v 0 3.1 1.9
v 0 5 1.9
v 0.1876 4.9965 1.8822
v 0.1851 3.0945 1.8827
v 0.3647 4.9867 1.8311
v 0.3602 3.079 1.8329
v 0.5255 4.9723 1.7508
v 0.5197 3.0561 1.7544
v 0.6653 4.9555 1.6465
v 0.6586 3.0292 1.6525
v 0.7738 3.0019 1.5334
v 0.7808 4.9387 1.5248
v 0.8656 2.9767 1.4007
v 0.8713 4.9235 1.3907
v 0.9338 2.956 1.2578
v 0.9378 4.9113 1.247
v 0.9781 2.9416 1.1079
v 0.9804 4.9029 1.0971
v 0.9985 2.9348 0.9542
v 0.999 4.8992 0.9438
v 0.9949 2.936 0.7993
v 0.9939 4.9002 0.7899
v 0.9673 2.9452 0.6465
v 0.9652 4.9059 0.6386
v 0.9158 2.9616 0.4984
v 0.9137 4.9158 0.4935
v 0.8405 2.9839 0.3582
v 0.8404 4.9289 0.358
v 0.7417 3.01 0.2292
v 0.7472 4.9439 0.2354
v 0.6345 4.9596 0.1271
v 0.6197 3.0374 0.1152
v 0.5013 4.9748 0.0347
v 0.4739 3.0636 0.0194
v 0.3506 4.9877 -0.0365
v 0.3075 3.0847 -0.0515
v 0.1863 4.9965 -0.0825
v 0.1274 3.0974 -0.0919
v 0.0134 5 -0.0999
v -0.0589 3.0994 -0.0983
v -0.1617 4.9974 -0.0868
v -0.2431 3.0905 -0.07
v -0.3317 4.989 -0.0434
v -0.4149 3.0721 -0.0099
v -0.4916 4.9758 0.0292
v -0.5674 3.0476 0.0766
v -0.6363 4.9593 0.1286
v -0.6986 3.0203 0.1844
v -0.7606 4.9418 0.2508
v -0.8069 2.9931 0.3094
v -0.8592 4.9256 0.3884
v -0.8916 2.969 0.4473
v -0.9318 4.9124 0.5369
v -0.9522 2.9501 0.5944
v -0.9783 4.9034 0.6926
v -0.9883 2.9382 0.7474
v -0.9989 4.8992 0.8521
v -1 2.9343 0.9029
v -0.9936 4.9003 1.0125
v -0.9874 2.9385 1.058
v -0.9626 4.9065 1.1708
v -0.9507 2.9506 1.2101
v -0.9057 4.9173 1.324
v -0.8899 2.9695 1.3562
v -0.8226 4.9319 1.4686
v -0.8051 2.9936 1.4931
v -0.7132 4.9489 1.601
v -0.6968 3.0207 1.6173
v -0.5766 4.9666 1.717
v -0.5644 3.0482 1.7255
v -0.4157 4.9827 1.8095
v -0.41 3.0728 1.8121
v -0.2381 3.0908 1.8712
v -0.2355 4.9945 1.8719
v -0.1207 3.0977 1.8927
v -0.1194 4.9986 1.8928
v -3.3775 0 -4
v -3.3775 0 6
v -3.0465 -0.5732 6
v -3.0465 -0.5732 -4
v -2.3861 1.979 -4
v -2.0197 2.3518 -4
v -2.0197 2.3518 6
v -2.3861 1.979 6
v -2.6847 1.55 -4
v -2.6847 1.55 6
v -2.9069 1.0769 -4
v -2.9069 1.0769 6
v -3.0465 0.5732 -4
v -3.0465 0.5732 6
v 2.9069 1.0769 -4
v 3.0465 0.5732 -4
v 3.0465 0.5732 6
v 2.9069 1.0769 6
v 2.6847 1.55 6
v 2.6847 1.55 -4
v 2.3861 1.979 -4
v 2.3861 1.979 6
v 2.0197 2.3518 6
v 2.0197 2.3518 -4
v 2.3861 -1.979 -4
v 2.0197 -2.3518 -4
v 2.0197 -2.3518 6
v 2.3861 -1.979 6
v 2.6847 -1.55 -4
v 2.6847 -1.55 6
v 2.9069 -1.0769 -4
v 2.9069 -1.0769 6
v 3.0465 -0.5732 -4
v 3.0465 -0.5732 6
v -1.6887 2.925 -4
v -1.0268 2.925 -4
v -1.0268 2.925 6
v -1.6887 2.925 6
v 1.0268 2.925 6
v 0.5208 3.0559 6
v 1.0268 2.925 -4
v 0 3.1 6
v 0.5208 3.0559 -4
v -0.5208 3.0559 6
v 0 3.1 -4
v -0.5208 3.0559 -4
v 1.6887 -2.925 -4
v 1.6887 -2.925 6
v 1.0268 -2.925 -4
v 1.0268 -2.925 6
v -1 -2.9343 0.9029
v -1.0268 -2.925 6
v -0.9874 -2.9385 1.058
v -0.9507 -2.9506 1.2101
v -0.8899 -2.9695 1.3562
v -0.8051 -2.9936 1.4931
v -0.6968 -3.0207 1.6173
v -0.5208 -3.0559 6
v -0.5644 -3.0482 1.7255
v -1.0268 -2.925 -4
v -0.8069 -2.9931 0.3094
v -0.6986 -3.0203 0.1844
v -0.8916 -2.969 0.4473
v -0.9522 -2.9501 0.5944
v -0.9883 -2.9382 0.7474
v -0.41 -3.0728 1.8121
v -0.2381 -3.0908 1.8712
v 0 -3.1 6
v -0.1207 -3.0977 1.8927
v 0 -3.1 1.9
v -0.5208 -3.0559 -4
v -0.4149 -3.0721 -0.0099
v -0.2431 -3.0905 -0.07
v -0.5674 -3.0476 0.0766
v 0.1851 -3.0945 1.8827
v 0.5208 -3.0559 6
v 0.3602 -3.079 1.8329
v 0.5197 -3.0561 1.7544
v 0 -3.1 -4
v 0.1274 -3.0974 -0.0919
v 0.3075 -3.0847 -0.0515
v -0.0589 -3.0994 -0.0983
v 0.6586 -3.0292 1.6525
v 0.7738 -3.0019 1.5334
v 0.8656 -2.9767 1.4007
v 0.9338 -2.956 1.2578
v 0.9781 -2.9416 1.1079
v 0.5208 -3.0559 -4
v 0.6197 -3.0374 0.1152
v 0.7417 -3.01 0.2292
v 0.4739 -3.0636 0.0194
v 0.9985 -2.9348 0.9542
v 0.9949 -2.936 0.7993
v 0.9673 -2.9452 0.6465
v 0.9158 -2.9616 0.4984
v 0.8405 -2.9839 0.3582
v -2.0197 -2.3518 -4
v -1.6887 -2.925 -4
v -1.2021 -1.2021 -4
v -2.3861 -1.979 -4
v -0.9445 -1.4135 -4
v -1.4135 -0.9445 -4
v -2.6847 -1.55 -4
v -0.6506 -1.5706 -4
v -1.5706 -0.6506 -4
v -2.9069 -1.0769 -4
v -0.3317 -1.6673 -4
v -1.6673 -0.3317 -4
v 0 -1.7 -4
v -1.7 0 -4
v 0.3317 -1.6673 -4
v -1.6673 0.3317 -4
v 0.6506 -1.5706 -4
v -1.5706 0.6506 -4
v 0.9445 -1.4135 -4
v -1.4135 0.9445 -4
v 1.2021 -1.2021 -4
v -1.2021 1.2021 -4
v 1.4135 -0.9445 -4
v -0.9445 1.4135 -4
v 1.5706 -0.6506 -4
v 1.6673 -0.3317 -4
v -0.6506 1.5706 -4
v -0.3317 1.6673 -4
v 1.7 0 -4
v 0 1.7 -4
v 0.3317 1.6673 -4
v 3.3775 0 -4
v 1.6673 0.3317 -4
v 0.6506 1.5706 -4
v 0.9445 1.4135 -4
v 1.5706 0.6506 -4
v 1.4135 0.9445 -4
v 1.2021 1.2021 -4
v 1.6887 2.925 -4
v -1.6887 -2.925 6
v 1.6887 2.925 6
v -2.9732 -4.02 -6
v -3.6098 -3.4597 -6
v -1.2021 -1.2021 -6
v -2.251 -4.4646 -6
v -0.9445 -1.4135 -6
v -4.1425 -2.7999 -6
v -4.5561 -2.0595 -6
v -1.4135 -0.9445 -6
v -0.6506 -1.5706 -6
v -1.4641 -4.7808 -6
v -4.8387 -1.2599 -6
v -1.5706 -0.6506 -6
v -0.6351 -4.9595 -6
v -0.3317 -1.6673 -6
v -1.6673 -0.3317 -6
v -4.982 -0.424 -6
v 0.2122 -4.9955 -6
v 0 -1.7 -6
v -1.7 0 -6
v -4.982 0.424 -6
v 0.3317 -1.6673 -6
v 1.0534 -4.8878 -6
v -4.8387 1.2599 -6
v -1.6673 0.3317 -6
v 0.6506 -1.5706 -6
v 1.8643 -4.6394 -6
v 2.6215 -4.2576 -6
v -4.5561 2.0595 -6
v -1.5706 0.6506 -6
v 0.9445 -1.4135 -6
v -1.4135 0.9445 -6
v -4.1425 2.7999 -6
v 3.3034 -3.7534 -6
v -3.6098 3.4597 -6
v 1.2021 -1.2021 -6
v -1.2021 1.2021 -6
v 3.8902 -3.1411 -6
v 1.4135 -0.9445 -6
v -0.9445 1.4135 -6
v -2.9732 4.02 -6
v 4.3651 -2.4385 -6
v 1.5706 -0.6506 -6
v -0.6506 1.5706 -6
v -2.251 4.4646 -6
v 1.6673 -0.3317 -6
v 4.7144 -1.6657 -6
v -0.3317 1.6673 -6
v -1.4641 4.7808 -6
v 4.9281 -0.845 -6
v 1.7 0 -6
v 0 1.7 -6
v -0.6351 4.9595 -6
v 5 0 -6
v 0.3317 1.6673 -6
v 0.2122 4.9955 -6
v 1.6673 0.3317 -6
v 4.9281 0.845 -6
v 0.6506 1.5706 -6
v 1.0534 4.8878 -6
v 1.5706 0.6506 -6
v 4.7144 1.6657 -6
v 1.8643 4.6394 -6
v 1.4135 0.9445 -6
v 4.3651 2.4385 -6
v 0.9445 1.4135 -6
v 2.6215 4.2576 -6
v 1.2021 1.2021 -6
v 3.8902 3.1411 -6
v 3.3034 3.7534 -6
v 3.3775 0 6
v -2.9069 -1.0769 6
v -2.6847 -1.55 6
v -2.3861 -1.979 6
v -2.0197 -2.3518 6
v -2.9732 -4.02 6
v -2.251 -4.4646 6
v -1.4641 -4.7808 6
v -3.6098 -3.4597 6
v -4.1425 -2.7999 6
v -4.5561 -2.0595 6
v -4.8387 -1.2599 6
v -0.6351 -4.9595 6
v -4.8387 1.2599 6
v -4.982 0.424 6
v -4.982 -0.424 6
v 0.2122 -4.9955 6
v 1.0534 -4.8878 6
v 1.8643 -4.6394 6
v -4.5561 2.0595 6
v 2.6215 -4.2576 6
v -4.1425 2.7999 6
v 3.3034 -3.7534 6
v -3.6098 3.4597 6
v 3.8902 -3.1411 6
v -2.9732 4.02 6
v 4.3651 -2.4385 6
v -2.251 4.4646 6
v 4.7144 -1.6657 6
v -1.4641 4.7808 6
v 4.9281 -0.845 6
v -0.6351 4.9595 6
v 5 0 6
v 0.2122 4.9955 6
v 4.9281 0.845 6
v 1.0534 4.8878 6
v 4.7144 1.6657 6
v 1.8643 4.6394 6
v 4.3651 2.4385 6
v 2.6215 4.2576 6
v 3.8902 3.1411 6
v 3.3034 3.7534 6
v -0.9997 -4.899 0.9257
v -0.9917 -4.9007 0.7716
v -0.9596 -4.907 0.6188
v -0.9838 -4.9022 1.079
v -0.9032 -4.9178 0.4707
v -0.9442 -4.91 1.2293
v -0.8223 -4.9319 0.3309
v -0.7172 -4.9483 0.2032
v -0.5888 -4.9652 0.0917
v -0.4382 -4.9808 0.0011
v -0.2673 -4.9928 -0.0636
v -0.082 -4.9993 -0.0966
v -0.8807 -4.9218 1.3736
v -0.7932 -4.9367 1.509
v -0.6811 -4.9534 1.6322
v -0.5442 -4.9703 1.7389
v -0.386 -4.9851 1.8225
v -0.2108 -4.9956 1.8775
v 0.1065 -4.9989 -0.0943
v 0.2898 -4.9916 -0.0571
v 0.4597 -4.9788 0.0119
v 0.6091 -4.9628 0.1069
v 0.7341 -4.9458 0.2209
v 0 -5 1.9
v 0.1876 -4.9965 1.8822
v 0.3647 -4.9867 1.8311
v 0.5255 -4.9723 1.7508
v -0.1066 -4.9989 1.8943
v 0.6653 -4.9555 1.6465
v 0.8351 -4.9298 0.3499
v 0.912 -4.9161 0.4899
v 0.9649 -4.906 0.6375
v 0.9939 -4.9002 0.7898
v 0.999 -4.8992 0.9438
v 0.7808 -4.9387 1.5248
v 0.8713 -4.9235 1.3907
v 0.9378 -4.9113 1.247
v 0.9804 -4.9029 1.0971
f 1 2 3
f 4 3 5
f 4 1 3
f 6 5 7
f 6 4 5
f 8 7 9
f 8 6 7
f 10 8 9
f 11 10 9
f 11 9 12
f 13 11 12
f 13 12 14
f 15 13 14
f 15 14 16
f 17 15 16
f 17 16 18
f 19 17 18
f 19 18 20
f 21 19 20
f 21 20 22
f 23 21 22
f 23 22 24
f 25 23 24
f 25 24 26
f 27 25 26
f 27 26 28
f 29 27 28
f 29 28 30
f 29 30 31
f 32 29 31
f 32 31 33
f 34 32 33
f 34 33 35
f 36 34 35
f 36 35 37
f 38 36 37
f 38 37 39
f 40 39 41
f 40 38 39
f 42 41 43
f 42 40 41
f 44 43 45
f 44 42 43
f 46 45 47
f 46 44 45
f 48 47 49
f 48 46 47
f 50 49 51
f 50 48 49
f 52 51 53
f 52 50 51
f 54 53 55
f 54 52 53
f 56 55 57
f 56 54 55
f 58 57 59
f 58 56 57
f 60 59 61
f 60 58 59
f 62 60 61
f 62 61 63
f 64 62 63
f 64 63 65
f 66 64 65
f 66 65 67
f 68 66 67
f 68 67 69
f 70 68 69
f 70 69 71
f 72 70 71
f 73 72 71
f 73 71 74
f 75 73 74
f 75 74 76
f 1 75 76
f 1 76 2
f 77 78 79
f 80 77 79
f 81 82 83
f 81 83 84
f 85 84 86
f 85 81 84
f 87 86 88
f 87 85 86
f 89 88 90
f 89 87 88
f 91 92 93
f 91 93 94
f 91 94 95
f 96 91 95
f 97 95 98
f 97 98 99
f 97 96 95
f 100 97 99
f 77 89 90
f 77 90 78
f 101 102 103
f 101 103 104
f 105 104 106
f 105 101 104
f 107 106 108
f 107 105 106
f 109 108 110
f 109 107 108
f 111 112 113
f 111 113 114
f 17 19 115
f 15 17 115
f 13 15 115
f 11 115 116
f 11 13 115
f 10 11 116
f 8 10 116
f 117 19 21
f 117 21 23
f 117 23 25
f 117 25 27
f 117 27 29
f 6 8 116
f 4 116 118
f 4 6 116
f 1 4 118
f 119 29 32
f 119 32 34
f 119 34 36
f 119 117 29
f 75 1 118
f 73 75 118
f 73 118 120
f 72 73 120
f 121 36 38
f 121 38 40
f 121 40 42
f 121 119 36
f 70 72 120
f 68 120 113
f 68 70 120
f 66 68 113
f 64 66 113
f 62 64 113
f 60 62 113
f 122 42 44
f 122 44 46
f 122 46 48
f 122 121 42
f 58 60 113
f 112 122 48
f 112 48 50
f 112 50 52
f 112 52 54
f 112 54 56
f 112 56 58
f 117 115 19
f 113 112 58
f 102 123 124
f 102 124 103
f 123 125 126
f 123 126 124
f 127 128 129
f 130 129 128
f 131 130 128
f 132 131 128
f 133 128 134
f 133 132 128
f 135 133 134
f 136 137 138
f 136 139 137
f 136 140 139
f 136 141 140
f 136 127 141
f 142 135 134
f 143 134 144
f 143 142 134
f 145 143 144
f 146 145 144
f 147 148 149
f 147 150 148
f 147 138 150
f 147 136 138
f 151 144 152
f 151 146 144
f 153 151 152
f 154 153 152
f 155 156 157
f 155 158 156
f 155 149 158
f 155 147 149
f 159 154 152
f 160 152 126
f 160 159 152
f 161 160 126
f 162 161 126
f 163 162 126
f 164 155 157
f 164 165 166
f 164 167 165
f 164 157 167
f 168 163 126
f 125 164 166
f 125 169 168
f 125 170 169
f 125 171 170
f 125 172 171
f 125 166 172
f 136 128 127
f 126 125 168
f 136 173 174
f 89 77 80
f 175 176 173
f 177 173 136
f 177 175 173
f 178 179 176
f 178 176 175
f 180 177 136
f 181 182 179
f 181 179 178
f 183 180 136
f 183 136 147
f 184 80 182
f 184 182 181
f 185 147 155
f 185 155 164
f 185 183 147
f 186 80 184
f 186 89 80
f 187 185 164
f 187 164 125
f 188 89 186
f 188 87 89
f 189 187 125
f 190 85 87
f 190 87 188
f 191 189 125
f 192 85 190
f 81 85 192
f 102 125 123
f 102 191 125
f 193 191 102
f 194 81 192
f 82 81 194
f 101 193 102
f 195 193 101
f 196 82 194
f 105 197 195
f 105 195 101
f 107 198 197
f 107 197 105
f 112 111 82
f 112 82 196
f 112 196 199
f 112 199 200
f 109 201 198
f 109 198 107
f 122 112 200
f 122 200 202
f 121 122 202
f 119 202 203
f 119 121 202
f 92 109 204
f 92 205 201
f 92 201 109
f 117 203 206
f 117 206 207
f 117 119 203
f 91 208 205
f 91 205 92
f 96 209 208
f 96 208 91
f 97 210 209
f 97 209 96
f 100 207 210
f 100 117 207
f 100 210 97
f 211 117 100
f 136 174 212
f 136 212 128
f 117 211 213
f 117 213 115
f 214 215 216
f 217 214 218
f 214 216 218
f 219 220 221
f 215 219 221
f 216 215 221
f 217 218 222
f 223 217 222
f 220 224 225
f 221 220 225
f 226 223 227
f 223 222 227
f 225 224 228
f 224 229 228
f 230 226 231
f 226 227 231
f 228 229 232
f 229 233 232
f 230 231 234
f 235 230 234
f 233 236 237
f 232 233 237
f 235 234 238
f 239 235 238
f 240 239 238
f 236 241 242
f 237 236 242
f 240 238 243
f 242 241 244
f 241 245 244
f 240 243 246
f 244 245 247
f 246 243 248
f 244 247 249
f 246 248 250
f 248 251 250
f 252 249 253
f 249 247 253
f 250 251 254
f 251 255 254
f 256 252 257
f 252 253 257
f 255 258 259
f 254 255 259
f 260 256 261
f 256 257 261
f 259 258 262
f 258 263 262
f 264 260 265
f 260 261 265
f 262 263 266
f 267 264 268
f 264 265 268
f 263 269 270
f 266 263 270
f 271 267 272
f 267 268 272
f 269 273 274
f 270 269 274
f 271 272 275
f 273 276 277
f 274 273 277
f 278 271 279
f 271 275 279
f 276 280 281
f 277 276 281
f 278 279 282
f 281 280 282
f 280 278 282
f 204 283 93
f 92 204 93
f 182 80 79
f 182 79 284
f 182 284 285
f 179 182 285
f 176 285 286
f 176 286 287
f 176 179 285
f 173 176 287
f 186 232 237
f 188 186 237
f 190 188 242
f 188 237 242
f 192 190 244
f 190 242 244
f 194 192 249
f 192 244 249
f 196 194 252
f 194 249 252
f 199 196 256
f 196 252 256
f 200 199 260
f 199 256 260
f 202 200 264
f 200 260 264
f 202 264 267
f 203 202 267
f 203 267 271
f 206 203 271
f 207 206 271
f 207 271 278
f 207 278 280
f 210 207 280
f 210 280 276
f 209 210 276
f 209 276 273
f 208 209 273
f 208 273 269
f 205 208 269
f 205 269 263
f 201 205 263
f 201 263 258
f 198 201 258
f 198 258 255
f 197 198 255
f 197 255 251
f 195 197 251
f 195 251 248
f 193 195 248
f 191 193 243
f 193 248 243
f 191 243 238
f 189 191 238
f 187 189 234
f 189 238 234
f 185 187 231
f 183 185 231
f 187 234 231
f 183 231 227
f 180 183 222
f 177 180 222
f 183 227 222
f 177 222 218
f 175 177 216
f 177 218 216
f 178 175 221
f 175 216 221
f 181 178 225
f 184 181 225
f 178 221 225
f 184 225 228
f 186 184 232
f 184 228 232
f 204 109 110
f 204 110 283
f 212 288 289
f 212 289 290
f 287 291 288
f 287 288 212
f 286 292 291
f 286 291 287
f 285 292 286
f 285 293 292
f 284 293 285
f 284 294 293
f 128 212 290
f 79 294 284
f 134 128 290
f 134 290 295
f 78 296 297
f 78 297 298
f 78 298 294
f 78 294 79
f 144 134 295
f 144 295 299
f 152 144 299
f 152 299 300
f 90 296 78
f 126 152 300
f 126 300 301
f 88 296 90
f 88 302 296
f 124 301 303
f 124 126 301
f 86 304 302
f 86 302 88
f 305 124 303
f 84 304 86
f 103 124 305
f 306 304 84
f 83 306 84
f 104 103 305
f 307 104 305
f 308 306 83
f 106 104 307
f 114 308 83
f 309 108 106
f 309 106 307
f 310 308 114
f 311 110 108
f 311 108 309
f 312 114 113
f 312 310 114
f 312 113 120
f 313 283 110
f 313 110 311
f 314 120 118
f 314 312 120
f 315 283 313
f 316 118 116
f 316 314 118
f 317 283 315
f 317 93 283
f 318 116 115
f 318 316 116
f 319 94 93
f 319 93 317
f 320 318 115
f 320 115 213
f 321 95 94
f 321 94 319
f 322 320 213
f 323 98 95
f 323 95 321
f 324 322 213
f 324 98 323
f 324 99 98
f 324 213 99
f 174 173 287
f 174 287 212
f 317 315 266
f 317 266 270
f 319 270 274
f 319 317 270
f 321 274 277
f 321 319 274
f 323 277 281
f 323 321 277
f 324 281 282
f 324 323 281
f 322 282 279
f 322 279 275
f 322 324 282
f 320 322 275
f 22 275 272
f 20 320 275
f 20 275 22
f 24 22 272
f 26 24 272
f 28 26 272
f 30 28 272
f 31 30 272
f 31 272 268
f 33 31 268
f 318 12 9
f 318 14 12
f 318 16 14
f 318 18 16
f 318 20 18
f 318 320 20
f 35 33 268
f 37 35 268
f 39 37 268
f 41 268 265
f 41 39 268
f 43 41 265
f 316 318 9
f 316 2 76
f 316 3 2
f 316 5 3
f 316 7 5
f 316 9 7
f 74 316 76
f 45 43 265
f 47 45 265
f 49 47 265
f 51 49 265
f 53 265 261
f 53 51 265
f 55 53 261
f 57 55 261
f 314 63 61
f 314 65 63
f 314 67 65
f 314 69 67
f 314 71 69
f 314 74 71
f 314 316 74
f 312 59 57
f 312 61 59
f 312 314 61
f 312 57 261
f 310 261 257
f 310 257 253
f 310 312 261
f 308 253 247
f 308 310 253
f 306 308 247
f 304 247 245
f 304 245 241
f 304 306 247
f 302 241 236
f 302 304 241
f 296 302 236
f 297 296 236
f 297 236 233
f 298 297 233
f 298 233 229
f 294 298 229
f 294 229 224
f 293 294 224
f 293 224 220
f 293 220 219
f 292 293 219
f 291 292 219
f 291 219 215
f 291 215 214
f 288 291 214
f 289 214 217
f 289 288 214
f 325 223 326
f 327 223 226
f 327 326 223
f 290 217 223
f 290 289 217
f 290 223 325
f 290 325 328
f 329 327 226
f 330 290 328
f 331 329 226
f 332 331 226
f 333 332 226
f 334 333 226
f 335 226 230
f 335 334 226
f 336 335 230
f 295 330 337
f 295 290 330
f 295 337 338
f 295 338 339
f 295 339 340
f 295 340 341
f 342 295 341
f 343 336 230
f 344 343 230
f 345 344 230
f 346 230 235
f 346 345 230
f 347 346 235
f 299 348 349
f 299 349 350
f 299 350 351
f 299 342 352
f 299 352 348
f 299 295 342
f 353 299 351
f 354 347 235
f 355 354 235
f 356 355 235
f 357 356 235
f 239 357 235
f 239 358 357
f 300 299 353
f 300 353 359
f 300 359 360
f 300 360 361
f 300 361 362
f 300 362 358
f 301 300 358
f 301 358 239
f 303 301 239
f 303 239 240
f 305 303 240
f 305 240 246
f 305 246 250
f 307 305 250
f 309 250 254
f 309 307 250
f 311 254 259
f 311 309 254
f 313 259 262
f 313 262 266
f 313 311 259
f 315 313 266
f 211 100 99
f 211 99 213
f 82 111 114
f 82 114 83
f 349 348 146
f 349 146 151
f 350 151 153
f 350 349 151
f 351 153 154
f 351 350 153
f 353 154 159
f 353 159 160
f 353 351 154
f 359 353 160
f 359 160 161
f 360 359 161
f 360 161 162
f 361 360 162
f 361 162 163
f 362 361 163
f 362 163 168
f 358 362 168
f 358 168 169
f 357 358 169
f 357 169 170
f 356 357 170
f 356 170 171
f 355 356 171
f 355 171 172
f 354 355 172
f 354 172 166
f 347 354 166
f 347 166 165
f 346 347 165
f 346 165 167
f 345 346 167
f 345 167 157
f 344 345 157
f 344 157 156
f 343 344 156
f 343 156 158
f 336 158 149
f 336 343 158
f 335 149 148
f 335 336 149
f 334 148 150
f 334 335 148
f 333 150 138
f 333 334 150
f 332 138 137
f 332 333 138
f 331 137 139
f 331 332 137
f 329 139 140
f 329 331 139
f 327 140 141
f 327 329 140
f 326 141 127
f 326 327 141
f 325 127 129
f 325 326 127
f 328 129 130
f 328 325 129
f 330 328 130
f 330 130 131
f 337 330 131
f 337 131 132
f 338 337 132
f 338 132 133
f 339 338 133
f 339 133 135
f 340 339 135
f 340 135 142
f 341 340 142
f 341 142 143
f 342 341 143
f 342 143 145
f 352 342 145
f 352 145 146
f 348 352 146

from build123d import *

# Parameters (mm, degrees)
SKETCH1_R               = 5
BOSS_EXTRUDE1_DEPTH     = 6
SKETCH2_R               = 3
CUT_EXTRUDE1_DEPTH      = 10
CUT_EXTRUDE2_DEPTH      = 13.247448714
MOVE_START              = -4
MOVE_FACE1_DEPTH        = 10
MOVE_FACE2_DEPTH        = 10
SKETCH4_R               = 1.7
CUT_EXTRUDE3_DEPTH      = 14.928388277
CUT_EXTRUDE7_DEPTH      = 10.273618495
CUT_EXTRUDE7_DEPTH_BACK = 10.273618495
SKETCH10_R              = 1


# Read off the part's stored shape, not the designer's step: Move Face1, Move Face2
with BuildPart() as part:
    # Sketch1 → Boss-Extrude1 (new, symmetric)
    with BuildSketch(Plane.XY):
        Circle(SKETCH1_R)
    extrude(amount=BOSS_EXTRUDE1_DEPTH, both=True)

    # Sketch2 → Cut-Extrude1 (cut)
    with BuildSketch(Plane.XY.offset(6)):
        Circle(SKETCH2_R)
    extrude(amount=-CUT_EXTRUDE1_DEPTH, mode=Mode.SUBTRACT)

    # Sketch3 → Cut-Extrude2 (cut, through all)
    with BuildSketch(Plane.XY.offset(-4)):
        Polygon((1.573279484, 2.725), (-1.573279484, 2.725), (-3.146558967, 0), (-1.573279484, -2.725), (1.573279484, -2.725), (3.146558967, 0), align=None)
    extrude(amount=CUT_EXTRUDE2_DEPTH, mode=Mode.SUBTRACT)

    # Move Face1 outline → Move Face1 (cut)
    with BuildSketch(Plane.XY.offset(MOVE_START)):
        with BuildLine():
            Line((2.866431597, -0.885194838), (3.377499075, 0))
            Line((3.377499075, 0), (2.866431597, 0.885194838))
            ThreePointArc((2.866431597, 0.885194838), (2.942674777, 0.583665277), (2.98728973, 0.275862411))
            Line((2.98728973, 0.275862411), (3.146558967, 0))
            Line((3.146558967, 0), (2.98728973, -0.275862411))
            ThreePointArc((2.98728973, -0.275862411), (2.942674777, -0.583665277), (2.866431597, -0.885194838))
        make_face()
        with BuildLine():
            Line((1.688749537, -2.925), (2.199817015, -2.039805162))
            ThreePointArc((2.199817015, -2.039805162), (1.976806346, -2.256598473), (1.732548721, -2.449137589))
            Line((1.732548721, -2.449137589), (1.573279484, -2.725))
            Line((1.573279484, -2.725), (1.254741009, -2.725))
            ThreePointArc((1.254741009, -2.725), (0.965868431, -2.840263751), (0.666614581, -2.925))
            Line((0.666614581, -2.925), (1.688749537, -2.925))
        make_face()
        with BuildLine():
            ThreePointArc((1.732548721, 2.449137589), (1.976806346, 2.256598473), (2.199817015, 2.039805162))
            Line((2.199817015, 2.039805162), (1.688749537, 2.925))
            Line((1.688749537, 2.925), (0.666614581, 2.925))
            ThreePointArc((0.666614581, 2.925), (0.965868431, 2.840263751), (1.254741009, 2.725))
            Line((1.254741009, 2.725), (1.573279484, 2.725))
            Line((1.573279484, 2.725), (1.732548721, 2.449137589))
        make_face()
        with BuildLine():
            Line((-1.688749537, -2.925), (-0.666614581, -2.925))
            ThreePointArc((-0.666614581, -2.925), (-0.965868431, -2.840263751), (-1.254741009, -2.725))
            Line((-1.254741009, -2.725), (-1.573279484, -2.725))
            Line((-1.573279484, -2.725), (-1.732548721, -2.449137589))
            ThreePointArc((-1.732548721, -2.449137589), (-1.976806346, -2.256598473), (-2.199817015, -2.039805162))
            Line((-2.199817015, -2.039805162), (-1.688749537, -2.925))
        make_face()
        with BuildLine():
            ThreePointArc((-1.254741009, 2.725), (-0.965868431, 2.840263751), (-0.666614581, 2.925))
            Line((-0.666614581, 2.925), (-1.688749537, 2.925))
            Line((-1.688749537, 2.925), (-2.199817015, 2.039805162))
            ThreePointArc((-2.199817015, 2.039805162), (-1.976806346, 2.256598473), (-1.732548721, 2.449137589))
            Line((-1.732548721, 2.449137589), (-1.573279484, 2.725))
            Line((-1.573279484, 2.725), (-1.254741009, 2.725))
        make_face()
        with BuildLine():
            Line((-3.377499075, 0), (-2.866431597, -0.885194838))
            ThreePointArc((-2.866431597, -0.885194838), (-2.942674777, -0.583665277), (-2.98728973, -0.275862411))
            Line((-2.98728973, -0.275862411), (-3.146558967, 0))
            Line((-3.146558967, 0), (-2.98728973, 0.275862411))
            ThreePointArc((-2.98728973, 0.275862411), (-2.942674777, 0.583665277), (-2.866431597, 0.885194838))
            Line((-2.866431597, 0.885194838), (-3.377499075, 0))
        make_face()
    extrude(amount=MOVE_FACE1_DEPTH, mode=Mode.SUBTRACT)

    # Move Face2 outline → Move Face2 (cut)
    with BuildSketch(Plane.XY.offset(MOVE_START)):
        with BuildLine():
            Line((2.866431597, 0.885194838), (3.046538126, 0.573241179))
            ThreePointArc((3.046538126, 0.573241179), (2.684678752, 1.55), (2.019710487, 2.351758821))
            Line((2.019710487, 2.351758821), (2.199817015, 2.039805162))
            ThreePointArc((2.199817015, 2.039805162), (2.598076211, 1.5), (2.866431597, 0.885194838))
        make_face()
        with BuildLine():
            ThreePointArc((2.019710487, -2.351758821), (2.684678752, -1.55), (3.046538126, -0.573241179))
            Line((3.046538126, -0.573241179), (2.866431597, -0.885194838))
            ThreePointArc((2.866431597, -0.885194838), (2.598076211, -1.5), (2.199817015, -2.039805162))
            Line((2.199817015, -2.039805162), (2.019710487, -2.351758821))
        make_face()
        with BuildLine():
            Line((0.666614581, 2.925), (1.026827639, 2.925))
            ThreePointArc((1.026827639, 2.925), (0, 3.1), (-1.026827639, 2.925))
            Line((-1.026827639, 2.925), (-0.666614581, 2.925))
            ThreePointArc((-0.666614581, 2.925), (0, 3), (0.666614581, 2.925))
        make_face()
        with BuildLine():
            ThreePointArc((-1.026827639, -2.925), (0, -3.1), (1.026827639, -2.925))
            Line((1.026827639, -2.925), (0.666614581, -2.925))
            ThreePointArc((0.666614581, -2.925), (0, -3), (-0.666614581, -2.925))
            Line((-0.666614581, -2.925), (-1.026827639, -2.925))
        make_face()
        with BuildLine():
            Line((-2.199817015, 2.039805162), (-2.019710487, 2.351758821))
            ThreePointArc((-2.019710487, 2.351758821), (-2.684678752, 1.55), (-3.046538126, 0.573241179))
            Line((-3.046538126, 0.573241179), (-2.866431597, 0.885194838))
            ThreePointArc((-2.866431597, 0.885194838), (-2.598076211, 1.5), (-2.199817015, 2.039805162))
        make_face()
        with BuildLine():
            ThreePointArc((-3.046538126, -0.573241179), (-2.684678752, -1.55), (-2.019710487, -2.351758821))
            Line((-2.019710487, -2.351758821), (-2.199817015, -2.039805162))
            ThreePointArc((-2.199817015, -2.039805162), (-2.598076211, -1.5), (-2.866431597, -0.885194838))
            Line((-2.866431597, -0.885194838), (-3.046538126, -0.573241179))
        make_face()
    extrude(amount=MOVE_FACE2_DEPTH, mode=Mode.SUBTRACT)

    # Sketch4 → Cut-Extrude3 (cut, through all)
    with BuildSketch(Plane(origin=(0, 0, -6), x_dir=(-1, 0, 0), z_dir=(0, 0, -1))):
        Circle(SKETCH4_R)
    extrude(amount=-CUT_EXTRUDE3_DEPTH, mode=Mode.SUBTRACT)

    # Sketch10 → Cut-Extrude7 (cut, two sides: drawn at the far end of the back side and taken through both)
    with BuildSketch(Plane(origin=(0, 0, 0), x_dir=(1, 0, 0), z_dir=(0, 1, 0)).offset(-CUT_EXTRUDE7_DEPTH_BACK)):
        with Locations(Location((0, -0.9, 0), (0, 0, 270))):
            Circle(SKETCH10_R)
    extrude(amount=CUT_EXTRUDE7_DEPTH + CUT_EXTRUDE7_DEPTH_BACK, mode=Mode.SUBTRACT)


solid = part.part
